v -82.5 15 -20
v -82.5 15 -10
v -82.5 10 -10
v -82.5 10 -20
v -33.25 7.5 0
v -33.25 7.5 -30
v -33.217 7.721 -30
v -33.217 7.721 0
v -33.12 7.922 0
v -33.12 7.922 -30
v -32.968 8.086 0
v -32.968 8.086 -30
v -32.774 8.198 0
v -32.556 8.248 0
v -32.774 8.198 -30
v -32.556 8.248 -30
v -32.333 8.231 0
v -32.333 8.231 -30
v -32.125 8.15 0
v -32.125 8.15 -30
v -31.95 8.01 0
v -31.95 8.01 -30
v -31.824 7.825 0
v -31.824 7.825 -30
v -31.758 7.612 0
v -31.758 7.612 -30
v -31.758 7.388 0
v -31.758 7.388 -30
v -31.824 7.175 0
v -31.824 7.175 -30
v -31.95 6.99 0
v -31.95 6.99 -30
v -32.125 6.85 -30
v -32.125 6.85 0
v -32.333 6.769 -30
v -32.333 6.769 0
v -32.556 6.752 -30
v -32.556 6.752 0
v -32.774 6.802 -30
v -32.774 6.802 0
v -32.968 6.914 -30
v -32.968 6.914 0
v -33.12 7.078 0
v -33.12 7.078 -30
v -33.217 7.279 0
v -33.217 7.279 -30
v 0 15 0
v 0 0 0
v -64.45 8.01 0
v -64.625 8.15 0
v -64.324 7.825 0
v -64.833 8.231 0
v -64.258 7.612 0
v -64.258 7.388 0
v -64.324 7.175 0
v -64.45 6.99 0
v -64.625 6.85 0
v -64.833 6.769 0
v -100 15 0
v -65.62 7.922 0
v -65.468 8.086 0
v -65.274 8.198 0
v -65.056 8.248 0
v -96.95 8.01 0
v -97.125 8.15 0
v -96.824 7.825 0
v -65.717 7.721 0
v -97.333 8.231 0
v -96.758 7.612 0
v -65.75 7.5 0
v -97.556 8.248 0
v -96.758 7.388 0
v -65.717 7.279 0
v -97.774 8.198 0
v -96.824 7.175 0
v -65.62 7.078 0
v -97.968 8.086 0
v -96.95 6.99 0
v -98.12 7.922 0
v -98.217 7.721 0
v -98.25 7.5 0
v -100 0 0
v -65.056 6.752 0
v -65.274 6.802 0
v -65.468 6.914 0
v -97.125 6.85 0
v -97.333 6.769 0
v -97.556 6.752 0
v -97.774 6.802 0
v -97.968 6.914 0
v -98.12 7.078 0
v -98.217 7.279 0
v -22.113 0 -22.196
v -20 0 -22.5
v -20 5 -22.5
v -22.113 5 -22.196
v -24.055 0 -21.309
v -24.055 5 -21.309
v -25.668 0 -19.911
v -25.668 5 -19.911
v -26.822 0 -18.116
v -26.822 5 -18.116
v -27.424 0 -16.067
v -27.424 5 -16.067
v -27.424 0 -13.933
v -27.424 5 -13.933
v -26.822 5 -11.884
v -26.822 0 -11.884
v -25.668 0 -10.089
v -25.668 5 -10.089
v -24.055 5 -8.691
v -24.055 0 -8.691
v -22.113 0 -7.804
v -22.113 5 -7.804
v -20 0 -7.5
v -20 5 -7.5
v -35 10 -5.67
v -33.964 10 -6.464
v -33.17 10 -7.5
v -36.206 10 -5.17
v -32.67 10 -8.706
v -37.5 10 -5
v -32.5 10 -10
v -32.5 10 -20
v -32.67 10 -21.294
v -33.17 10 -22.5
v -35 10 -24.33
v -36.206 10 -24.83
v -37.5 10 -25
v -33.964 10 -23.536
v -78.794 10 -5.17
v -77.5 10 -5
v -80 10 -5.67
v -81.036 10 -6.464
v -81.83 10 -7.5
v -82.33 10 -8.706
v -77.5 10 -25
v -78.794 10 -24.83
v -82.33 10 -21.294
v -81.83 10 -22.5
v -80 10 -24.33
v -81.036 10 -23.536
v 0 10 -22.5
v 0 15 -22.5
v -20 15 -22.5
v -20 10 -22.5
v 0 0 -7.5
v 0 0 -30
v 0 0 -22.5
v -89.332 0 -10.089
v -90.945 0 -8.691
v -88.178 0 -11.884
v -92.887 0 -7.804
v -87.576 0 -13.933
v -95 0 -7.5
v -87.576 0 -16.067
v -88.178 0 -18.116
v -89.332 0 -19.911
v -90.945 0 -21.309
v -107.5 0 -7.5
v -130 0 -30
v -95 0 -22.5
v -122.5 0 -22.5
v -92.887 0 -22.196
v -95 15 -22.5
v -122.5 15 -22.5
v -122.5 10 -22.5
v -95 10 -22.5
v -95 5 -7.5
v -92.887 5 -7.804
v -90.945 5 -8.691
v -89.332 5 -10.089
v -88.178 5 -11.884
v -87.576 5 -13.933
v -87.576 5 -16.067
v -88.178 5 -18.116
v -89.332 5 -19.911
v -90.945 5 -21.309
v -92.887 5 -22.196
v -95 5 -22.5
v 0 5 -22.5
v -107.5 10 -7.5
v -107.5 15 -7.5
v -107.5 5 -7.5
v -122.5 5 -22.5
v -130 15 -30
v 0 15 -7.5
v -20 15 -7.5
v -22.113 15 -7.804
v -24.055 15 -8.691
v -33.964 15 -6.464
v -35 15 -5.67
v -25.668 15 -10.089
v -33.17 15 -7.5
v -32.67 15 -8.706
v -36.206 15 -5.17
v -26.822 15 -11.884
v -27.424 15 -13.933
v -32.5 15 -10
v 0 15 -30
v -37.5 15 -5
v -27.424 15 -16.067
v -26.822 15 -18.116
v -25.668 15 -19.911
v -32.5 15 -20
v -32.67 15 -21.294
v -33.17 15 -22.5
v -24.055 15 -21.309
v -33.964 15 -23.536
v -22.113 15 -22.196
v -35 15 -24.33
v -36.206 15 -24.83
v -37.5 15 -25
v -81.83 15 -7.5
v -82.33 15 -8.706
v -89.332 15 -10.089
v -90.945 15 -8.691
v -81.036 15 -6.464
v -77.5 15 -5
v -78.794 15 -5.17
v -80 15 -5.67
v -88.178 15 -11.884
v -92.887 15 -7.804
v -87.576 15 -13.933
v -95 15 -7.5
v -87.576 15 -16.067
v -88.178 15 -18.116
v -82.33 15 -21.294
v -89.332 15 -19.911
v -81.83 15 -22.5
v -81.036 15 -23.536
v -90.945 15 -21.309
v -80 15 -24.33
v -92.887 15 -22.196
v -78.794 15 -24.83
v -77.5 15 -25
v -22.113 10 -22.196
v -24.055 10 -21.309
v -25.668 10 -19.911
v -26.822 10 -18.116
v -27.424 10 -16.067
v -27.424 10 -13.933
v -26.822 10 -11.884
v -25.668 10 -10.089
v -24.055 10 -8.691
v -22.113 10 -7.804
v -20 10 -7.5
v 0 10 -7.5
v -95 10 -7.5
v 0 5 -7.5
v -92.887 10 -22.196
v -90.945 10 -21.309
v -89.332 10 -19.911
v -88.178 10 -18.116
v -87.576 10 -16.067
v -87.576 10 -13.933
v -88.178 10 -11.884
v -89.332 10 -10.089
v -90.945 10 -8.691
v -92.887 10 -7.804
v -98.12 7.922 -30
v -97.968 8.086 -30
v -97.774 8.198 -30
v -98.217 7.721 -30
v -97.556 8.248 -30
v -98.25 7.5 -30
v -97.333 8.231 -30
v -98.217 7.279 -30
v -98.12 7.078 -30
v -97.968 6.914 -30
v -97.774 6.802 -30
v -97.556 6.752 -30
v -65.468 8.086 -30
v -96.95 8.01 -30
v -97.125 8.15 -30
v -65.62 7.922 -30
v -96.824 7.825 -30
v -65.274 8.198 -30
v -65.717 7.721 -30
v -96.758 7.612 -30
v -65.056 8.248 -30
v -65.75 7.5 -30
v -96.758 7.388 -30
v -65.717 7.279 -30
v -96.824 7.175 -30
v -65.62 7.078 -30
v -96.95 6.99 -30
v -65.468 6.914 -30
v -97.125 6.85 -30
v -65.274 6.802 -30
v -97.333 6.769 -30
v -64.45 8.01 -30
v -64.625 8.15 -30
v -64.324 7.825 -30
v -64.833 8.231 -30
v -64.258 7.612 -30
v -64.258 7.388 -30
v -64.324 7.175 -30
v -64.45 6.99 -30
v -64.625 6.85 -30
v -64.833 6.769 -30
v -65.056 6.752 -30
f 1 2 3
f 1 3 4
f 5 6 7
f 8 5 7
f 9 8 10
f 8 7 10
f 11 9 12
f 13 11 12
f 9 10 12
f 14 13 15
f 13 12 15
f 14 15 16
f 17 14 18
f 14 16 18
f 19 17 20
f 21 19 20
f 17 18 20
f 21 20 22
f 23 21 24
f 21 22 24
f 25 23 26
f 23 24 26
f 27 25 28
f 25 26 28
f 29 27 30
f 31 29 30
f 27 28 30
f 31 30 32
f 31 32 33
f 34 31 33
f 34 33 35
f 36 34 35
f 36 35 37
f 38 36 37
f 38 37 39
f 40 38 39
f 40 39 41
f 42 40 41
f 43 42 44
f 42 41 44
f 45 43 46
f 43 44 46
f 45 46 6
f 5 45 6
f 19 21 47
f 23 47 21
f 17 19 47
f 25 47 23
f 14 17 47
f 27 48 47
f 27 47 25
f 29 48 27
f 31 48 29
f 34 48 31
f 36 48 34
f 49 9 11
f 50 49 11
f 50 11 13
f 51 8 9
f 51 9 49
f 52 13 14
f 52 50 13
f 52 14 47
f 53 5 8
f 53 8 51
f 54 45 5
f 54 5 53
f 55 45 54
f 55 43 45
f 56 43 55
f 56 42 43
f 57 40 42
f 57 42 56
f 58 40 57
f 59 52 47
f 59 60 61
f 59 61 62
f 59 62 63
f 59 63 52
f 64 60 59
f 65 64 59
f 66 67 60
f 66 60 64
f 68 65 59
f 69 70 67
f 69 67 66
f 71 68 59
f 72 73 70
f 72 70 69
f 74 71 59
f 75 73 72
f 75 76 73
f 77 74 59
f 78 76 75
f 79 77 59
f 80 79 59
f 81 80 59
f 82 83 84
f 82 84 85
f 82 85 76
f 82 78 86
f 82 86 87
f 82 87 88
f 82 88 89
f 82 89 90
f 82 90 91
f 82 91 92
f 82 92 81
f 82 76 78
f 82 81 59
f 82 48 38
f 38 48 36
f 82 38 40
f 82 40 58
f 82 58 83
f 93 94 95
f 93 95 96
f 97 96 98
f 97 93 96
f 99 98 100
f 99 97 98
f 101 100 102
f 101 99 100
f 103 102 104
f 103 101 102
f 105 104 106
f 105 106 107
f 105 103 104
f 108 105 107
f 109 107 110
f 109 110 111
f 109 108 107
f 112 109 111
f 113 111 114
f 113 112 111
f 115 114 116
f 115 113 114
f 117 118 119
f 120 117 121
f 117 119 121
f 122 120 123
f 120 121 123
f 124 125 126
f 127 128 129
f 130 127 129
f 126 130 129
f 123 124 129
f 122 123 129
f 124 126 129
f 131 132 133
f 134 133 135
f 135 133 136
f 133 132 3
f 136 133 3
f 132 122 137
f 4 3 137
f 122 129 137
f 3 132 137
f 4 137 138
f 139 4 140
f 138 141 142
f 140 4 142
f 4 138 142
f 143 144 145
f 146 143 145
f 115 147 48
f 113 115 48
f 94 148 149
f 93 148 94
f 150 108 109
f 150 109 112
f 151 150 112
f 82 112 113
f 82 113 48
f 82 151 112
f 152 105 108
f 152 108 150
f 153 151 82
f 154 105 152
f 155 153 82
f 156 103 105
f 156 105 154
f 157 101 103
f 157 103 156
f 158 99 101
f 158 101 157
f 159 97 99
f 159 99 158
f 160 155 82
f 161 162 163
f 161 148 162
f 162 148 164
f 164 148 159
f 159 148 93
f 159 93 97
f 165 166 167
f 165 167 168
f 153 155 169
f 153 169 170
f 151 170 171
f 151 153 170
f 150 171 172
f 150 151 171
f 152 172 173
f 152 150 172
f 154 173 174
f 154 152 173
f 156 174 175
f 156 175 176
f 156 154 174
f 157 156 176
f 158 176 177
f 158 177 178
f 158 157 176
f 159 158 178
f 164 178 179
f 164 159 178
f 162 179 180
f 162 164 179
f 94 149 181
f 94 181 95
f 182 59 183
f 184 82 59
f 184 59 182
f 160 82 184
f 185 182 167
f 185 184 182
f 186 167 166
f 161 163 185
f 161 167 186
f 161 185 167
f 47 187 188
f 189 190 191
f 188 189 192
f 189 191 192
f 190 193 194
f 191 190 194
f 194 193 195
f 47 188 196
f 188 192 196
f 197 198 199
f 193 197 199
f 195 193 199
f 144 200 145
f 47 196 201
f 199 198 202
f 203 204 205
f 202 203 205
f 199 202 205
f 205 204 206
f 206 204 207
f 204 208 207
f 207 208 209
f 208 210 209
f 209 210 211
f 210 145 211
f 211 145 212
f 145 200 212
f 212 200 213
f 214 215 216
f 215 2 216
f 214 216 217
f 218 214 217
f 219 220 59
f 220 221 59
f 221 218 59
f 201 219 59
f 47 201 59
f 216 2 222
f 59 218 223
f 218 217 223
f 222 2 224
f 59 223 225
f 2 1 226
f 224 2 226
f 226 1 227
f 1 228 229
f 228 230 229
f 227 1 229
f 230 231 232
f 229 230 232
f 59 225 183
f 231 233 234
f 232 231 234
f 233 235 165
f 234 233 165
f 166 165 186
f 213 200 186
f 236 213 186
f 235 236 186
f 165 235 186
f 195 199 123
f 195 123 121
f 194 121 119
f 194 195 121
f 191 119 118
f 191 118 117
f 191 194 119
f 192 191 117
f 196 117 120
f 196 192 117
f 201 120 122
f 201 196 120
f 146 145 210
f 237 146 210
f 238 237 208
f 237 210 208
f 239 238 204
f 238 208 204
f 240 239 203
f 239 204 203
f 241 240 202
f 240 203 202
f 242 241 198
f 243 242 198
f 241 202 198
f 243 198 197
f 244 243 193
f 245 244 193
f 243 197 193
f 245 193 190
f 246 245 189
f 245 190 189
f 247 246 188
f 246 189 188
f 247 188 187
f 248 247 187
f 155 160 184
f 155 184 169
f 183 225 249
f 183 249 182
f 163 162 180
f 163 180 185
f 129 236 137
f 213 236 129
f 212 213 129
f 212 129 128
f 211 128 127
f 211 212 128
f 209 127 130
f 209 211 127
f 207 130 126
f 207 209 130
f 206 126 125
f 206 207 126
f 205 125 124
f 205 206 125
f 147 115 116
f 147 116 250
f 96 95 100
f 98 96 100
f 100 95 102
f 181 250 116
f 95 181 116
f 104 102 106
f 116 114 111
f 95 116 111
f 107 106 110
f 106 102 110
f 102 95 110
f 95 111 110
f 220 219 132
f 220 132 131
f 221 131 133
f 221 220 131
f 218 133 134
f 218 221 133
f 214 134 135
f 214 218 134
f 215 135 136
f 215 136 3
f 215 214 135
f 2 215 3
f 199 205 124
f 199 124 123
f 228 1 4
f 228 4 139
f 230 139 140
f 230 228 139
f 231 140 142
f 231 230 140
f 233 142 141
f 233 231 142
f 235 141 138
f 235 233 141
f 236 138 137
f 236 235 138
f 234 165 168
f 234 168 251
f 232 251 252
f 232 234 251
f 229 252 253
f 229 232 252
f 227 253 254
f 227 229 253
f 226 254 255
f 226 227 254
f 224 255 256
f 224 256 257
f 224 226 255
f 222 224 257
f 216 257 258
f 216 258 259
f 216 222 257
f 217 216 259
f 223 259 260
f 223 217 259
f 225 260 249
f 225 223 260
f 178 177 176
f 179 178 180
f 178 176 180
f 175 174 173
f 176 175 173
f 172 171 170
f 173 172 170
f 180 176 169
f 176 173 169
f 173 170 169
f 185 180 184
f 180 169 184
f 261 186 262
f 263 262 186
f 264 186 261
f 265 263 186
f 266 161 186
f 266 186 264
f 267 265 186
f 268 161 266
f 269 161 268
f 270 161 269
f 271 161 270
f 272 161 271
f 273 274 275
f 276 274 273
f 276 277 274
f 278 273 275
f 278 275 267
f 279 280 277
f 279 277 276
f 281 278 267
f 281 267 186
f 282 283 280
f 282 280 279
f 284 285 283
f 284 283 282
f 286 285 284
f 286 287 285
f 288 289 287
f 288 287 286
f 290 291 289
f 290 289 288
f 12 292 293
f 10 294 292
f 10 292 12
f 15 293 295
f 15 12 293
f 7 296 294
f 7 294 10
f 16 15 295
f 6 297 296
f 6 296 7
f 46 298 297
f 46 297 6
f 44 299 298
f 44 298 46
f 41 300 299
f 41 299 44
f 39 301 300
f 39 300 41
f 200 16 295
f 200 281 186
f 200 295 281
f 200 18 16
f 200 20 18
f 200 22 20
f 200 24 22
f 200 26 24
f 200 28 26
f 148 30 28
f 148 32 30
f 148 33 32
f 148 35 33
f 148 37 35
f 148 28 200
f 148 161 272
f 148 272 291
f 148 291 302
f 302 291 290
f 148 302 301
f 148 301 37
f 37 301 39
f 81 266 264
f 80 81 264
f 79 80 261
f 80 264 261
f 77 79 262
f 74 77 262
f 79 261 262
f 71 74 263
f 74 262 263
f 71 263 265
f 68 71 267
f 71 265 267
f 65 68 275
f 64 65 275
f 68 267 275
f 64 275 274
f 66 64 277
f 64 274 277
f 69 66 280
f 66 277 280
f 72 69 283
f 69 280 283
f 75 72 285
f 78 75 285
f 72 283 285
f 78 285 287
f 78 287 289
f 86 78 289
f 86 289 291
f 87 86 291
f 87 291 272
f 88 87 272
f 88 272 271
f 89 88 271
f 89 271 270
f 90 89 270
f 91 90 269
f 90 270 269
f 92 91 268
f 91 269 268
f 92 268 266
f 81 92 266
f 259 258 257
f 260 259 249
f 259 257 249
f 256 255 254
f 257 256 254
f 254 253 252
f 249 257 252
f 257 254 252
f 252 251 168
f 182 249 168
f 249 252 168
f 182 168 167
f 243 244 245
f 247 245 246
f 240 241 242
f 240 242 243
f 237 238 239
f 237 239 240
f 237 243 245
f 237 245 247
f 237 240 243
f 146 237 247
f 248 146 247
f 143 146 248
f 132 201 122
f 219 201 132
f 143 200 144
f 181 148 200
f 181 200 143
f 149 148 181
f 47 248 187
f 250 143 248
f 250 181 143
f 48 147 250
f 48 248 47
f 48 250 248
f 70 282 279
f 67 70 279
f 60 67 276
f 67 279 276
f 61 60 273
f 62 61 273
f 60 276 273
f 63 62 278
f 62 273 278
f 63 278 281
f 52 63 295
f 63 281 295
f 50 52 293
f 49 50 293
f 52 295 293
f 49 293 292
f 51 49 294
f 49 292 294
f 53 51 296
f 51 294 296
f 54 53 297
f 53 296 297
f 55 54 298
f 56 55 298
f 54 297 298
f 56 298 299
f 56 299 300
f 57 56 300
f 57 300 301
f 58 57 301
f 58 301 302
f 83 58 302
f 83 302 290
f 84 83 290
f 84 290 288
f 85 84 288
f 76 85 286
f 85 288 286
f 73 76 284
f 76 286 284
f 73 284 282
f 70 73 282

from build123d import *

# Parameters (mm, degrees)
BOSS_EXTRUDE1_DEPTH = 15
CUT_EXTRUDE1_DEPTH  = 5
CUT_EXTRUDE2_DEPTH  = 5
SKETCH4_R           = 0.75
CUT_EXTRUDE3_DEPTH  = 30
CUT_EXTRUDE4_DEPTH  = 5


with BuildPart() as part:
    # Sketch1 → Boss-Extrude1 (new body)
    with BuildSketch(Plane(origin=(0, 0, 0), x_dir=(1, 0, 0), z_dir=(0, 1, 0))):
        Polygon((0, 0), (-100, 0), (-130, 30), (0, 30), align=None)
    extrude(amount=BOSS_EXTRUDE1_DEPTH)

    # Sketch2 → Cut-Extrude1 (cut)
    with BuildSketch(Plane(origin=(0, 15, 0), x_dir=(1, 0, 0), z_dir=(0, 1, 0))):
        with BuildLine():
            Line((-135, 22.5), (-95, 22.5))
            ThreePointArc((-95, 22.5), (-87.5, 15), (-95, 7.5))
            Line((-95, 7.5), (-135, 7.5))
            ThreePointArc((-135, 7.5), (-142.5, 15), (-135, 22.5))
        make_face()
        with BuildLine():
            Line((20, 22.5), (-20, 22.5))
            ThreePointArc((-20, 22.5), (-27.5, 15), (-20, 7.5))
            Line((-20, 7.5), (20, 7.5))
            ThreePointArc((20, 7.5), (27.5, 15), (20, 22.5))
        make_face()
    extrude(amount=-CUT_EXTRUDE1_DEPTH, mode=Mode.SUBTRACT)

    # Sketch3 → Cut-Extrude2 (cut)
    with BuildSketch(Plane.XZ):
        with BuildLine():
            Line((0, -7.5), (0, -22.5))
            Line((0, -22.5), (-20, -22.5))
            ThreePointArc((-20, -22.5), (-27.5, -15), (-20, -7.5))
            Line((-20, -7.5), (0, -7.5))
        make_face()
        with BuildLine():
            Line((-122.5, -22.5), (-107.5, -7.5))
            Line((-107.5, -7.5), (-95, -7.5))
            ThreePointArc((-95, -7.5), (-87.5, -15), (-95, -22.5))
            Line((-95, -22.5), (-122.5, -22.5))
        make_face()
    extrude(amount=-CUT_EXTRUDE2_DEPTH, mode=Mode.SUBTRACT)

    # Sketch4 → Cut-Extrude3 (cut)
    with BuildSketch(Plane(origin=(0, 0, -30), x_dir=(-1, 0, 0), z_dir=(0, 0, -1))):
        with Locations((65, 7.5)):
            Circle(SKETCH4_R)
        with Locations((32.5, 7.5)):
            Circle(SKETCH4_R)
        with Locations((97.5, 7.5)):
            Circle(SKETCH4_R)
    extrude(amount=-CUT_EXTRUDE3_DEPTH, mode=Mode.SUBTRACT)

    # Sketch5 → Cut-Extrude4 (cut)
    with BuildSketch(Plane(origin=(0, 15, 0), x_dir=(1, 0, 0), z_dir=(0, 1, 0))):
        with BuildLine():
            Line((-77.5, 25), (-37.5, 25))
            ThreePointArc((-37.5, 25), (-33.964466094, 23.535533906), (-32.5, 20))
            Line((-32.5, 20), (-32.5, 10))
            ThreePointArc((-32.5, 10), (-33.964466094, 6.464466094), (-37.5, 5))
            Line((-37.5, 5), (-77.5, 5))
            ThreePointArc((-77.5, 5), (-81.035533906, 6.464466094), (-82.5, 10))
            Line((-82.5, 10), (-82.5, 20))
            ThreePointArc((-82.5, 20), (-81.035533906, 23.535533906), (-77.5, 25))
        make_face()
    extrude(amount=-CUT_EXTRUDE4_DEPTH, mode=Mode.SUBTRACT)


solid = part.part
